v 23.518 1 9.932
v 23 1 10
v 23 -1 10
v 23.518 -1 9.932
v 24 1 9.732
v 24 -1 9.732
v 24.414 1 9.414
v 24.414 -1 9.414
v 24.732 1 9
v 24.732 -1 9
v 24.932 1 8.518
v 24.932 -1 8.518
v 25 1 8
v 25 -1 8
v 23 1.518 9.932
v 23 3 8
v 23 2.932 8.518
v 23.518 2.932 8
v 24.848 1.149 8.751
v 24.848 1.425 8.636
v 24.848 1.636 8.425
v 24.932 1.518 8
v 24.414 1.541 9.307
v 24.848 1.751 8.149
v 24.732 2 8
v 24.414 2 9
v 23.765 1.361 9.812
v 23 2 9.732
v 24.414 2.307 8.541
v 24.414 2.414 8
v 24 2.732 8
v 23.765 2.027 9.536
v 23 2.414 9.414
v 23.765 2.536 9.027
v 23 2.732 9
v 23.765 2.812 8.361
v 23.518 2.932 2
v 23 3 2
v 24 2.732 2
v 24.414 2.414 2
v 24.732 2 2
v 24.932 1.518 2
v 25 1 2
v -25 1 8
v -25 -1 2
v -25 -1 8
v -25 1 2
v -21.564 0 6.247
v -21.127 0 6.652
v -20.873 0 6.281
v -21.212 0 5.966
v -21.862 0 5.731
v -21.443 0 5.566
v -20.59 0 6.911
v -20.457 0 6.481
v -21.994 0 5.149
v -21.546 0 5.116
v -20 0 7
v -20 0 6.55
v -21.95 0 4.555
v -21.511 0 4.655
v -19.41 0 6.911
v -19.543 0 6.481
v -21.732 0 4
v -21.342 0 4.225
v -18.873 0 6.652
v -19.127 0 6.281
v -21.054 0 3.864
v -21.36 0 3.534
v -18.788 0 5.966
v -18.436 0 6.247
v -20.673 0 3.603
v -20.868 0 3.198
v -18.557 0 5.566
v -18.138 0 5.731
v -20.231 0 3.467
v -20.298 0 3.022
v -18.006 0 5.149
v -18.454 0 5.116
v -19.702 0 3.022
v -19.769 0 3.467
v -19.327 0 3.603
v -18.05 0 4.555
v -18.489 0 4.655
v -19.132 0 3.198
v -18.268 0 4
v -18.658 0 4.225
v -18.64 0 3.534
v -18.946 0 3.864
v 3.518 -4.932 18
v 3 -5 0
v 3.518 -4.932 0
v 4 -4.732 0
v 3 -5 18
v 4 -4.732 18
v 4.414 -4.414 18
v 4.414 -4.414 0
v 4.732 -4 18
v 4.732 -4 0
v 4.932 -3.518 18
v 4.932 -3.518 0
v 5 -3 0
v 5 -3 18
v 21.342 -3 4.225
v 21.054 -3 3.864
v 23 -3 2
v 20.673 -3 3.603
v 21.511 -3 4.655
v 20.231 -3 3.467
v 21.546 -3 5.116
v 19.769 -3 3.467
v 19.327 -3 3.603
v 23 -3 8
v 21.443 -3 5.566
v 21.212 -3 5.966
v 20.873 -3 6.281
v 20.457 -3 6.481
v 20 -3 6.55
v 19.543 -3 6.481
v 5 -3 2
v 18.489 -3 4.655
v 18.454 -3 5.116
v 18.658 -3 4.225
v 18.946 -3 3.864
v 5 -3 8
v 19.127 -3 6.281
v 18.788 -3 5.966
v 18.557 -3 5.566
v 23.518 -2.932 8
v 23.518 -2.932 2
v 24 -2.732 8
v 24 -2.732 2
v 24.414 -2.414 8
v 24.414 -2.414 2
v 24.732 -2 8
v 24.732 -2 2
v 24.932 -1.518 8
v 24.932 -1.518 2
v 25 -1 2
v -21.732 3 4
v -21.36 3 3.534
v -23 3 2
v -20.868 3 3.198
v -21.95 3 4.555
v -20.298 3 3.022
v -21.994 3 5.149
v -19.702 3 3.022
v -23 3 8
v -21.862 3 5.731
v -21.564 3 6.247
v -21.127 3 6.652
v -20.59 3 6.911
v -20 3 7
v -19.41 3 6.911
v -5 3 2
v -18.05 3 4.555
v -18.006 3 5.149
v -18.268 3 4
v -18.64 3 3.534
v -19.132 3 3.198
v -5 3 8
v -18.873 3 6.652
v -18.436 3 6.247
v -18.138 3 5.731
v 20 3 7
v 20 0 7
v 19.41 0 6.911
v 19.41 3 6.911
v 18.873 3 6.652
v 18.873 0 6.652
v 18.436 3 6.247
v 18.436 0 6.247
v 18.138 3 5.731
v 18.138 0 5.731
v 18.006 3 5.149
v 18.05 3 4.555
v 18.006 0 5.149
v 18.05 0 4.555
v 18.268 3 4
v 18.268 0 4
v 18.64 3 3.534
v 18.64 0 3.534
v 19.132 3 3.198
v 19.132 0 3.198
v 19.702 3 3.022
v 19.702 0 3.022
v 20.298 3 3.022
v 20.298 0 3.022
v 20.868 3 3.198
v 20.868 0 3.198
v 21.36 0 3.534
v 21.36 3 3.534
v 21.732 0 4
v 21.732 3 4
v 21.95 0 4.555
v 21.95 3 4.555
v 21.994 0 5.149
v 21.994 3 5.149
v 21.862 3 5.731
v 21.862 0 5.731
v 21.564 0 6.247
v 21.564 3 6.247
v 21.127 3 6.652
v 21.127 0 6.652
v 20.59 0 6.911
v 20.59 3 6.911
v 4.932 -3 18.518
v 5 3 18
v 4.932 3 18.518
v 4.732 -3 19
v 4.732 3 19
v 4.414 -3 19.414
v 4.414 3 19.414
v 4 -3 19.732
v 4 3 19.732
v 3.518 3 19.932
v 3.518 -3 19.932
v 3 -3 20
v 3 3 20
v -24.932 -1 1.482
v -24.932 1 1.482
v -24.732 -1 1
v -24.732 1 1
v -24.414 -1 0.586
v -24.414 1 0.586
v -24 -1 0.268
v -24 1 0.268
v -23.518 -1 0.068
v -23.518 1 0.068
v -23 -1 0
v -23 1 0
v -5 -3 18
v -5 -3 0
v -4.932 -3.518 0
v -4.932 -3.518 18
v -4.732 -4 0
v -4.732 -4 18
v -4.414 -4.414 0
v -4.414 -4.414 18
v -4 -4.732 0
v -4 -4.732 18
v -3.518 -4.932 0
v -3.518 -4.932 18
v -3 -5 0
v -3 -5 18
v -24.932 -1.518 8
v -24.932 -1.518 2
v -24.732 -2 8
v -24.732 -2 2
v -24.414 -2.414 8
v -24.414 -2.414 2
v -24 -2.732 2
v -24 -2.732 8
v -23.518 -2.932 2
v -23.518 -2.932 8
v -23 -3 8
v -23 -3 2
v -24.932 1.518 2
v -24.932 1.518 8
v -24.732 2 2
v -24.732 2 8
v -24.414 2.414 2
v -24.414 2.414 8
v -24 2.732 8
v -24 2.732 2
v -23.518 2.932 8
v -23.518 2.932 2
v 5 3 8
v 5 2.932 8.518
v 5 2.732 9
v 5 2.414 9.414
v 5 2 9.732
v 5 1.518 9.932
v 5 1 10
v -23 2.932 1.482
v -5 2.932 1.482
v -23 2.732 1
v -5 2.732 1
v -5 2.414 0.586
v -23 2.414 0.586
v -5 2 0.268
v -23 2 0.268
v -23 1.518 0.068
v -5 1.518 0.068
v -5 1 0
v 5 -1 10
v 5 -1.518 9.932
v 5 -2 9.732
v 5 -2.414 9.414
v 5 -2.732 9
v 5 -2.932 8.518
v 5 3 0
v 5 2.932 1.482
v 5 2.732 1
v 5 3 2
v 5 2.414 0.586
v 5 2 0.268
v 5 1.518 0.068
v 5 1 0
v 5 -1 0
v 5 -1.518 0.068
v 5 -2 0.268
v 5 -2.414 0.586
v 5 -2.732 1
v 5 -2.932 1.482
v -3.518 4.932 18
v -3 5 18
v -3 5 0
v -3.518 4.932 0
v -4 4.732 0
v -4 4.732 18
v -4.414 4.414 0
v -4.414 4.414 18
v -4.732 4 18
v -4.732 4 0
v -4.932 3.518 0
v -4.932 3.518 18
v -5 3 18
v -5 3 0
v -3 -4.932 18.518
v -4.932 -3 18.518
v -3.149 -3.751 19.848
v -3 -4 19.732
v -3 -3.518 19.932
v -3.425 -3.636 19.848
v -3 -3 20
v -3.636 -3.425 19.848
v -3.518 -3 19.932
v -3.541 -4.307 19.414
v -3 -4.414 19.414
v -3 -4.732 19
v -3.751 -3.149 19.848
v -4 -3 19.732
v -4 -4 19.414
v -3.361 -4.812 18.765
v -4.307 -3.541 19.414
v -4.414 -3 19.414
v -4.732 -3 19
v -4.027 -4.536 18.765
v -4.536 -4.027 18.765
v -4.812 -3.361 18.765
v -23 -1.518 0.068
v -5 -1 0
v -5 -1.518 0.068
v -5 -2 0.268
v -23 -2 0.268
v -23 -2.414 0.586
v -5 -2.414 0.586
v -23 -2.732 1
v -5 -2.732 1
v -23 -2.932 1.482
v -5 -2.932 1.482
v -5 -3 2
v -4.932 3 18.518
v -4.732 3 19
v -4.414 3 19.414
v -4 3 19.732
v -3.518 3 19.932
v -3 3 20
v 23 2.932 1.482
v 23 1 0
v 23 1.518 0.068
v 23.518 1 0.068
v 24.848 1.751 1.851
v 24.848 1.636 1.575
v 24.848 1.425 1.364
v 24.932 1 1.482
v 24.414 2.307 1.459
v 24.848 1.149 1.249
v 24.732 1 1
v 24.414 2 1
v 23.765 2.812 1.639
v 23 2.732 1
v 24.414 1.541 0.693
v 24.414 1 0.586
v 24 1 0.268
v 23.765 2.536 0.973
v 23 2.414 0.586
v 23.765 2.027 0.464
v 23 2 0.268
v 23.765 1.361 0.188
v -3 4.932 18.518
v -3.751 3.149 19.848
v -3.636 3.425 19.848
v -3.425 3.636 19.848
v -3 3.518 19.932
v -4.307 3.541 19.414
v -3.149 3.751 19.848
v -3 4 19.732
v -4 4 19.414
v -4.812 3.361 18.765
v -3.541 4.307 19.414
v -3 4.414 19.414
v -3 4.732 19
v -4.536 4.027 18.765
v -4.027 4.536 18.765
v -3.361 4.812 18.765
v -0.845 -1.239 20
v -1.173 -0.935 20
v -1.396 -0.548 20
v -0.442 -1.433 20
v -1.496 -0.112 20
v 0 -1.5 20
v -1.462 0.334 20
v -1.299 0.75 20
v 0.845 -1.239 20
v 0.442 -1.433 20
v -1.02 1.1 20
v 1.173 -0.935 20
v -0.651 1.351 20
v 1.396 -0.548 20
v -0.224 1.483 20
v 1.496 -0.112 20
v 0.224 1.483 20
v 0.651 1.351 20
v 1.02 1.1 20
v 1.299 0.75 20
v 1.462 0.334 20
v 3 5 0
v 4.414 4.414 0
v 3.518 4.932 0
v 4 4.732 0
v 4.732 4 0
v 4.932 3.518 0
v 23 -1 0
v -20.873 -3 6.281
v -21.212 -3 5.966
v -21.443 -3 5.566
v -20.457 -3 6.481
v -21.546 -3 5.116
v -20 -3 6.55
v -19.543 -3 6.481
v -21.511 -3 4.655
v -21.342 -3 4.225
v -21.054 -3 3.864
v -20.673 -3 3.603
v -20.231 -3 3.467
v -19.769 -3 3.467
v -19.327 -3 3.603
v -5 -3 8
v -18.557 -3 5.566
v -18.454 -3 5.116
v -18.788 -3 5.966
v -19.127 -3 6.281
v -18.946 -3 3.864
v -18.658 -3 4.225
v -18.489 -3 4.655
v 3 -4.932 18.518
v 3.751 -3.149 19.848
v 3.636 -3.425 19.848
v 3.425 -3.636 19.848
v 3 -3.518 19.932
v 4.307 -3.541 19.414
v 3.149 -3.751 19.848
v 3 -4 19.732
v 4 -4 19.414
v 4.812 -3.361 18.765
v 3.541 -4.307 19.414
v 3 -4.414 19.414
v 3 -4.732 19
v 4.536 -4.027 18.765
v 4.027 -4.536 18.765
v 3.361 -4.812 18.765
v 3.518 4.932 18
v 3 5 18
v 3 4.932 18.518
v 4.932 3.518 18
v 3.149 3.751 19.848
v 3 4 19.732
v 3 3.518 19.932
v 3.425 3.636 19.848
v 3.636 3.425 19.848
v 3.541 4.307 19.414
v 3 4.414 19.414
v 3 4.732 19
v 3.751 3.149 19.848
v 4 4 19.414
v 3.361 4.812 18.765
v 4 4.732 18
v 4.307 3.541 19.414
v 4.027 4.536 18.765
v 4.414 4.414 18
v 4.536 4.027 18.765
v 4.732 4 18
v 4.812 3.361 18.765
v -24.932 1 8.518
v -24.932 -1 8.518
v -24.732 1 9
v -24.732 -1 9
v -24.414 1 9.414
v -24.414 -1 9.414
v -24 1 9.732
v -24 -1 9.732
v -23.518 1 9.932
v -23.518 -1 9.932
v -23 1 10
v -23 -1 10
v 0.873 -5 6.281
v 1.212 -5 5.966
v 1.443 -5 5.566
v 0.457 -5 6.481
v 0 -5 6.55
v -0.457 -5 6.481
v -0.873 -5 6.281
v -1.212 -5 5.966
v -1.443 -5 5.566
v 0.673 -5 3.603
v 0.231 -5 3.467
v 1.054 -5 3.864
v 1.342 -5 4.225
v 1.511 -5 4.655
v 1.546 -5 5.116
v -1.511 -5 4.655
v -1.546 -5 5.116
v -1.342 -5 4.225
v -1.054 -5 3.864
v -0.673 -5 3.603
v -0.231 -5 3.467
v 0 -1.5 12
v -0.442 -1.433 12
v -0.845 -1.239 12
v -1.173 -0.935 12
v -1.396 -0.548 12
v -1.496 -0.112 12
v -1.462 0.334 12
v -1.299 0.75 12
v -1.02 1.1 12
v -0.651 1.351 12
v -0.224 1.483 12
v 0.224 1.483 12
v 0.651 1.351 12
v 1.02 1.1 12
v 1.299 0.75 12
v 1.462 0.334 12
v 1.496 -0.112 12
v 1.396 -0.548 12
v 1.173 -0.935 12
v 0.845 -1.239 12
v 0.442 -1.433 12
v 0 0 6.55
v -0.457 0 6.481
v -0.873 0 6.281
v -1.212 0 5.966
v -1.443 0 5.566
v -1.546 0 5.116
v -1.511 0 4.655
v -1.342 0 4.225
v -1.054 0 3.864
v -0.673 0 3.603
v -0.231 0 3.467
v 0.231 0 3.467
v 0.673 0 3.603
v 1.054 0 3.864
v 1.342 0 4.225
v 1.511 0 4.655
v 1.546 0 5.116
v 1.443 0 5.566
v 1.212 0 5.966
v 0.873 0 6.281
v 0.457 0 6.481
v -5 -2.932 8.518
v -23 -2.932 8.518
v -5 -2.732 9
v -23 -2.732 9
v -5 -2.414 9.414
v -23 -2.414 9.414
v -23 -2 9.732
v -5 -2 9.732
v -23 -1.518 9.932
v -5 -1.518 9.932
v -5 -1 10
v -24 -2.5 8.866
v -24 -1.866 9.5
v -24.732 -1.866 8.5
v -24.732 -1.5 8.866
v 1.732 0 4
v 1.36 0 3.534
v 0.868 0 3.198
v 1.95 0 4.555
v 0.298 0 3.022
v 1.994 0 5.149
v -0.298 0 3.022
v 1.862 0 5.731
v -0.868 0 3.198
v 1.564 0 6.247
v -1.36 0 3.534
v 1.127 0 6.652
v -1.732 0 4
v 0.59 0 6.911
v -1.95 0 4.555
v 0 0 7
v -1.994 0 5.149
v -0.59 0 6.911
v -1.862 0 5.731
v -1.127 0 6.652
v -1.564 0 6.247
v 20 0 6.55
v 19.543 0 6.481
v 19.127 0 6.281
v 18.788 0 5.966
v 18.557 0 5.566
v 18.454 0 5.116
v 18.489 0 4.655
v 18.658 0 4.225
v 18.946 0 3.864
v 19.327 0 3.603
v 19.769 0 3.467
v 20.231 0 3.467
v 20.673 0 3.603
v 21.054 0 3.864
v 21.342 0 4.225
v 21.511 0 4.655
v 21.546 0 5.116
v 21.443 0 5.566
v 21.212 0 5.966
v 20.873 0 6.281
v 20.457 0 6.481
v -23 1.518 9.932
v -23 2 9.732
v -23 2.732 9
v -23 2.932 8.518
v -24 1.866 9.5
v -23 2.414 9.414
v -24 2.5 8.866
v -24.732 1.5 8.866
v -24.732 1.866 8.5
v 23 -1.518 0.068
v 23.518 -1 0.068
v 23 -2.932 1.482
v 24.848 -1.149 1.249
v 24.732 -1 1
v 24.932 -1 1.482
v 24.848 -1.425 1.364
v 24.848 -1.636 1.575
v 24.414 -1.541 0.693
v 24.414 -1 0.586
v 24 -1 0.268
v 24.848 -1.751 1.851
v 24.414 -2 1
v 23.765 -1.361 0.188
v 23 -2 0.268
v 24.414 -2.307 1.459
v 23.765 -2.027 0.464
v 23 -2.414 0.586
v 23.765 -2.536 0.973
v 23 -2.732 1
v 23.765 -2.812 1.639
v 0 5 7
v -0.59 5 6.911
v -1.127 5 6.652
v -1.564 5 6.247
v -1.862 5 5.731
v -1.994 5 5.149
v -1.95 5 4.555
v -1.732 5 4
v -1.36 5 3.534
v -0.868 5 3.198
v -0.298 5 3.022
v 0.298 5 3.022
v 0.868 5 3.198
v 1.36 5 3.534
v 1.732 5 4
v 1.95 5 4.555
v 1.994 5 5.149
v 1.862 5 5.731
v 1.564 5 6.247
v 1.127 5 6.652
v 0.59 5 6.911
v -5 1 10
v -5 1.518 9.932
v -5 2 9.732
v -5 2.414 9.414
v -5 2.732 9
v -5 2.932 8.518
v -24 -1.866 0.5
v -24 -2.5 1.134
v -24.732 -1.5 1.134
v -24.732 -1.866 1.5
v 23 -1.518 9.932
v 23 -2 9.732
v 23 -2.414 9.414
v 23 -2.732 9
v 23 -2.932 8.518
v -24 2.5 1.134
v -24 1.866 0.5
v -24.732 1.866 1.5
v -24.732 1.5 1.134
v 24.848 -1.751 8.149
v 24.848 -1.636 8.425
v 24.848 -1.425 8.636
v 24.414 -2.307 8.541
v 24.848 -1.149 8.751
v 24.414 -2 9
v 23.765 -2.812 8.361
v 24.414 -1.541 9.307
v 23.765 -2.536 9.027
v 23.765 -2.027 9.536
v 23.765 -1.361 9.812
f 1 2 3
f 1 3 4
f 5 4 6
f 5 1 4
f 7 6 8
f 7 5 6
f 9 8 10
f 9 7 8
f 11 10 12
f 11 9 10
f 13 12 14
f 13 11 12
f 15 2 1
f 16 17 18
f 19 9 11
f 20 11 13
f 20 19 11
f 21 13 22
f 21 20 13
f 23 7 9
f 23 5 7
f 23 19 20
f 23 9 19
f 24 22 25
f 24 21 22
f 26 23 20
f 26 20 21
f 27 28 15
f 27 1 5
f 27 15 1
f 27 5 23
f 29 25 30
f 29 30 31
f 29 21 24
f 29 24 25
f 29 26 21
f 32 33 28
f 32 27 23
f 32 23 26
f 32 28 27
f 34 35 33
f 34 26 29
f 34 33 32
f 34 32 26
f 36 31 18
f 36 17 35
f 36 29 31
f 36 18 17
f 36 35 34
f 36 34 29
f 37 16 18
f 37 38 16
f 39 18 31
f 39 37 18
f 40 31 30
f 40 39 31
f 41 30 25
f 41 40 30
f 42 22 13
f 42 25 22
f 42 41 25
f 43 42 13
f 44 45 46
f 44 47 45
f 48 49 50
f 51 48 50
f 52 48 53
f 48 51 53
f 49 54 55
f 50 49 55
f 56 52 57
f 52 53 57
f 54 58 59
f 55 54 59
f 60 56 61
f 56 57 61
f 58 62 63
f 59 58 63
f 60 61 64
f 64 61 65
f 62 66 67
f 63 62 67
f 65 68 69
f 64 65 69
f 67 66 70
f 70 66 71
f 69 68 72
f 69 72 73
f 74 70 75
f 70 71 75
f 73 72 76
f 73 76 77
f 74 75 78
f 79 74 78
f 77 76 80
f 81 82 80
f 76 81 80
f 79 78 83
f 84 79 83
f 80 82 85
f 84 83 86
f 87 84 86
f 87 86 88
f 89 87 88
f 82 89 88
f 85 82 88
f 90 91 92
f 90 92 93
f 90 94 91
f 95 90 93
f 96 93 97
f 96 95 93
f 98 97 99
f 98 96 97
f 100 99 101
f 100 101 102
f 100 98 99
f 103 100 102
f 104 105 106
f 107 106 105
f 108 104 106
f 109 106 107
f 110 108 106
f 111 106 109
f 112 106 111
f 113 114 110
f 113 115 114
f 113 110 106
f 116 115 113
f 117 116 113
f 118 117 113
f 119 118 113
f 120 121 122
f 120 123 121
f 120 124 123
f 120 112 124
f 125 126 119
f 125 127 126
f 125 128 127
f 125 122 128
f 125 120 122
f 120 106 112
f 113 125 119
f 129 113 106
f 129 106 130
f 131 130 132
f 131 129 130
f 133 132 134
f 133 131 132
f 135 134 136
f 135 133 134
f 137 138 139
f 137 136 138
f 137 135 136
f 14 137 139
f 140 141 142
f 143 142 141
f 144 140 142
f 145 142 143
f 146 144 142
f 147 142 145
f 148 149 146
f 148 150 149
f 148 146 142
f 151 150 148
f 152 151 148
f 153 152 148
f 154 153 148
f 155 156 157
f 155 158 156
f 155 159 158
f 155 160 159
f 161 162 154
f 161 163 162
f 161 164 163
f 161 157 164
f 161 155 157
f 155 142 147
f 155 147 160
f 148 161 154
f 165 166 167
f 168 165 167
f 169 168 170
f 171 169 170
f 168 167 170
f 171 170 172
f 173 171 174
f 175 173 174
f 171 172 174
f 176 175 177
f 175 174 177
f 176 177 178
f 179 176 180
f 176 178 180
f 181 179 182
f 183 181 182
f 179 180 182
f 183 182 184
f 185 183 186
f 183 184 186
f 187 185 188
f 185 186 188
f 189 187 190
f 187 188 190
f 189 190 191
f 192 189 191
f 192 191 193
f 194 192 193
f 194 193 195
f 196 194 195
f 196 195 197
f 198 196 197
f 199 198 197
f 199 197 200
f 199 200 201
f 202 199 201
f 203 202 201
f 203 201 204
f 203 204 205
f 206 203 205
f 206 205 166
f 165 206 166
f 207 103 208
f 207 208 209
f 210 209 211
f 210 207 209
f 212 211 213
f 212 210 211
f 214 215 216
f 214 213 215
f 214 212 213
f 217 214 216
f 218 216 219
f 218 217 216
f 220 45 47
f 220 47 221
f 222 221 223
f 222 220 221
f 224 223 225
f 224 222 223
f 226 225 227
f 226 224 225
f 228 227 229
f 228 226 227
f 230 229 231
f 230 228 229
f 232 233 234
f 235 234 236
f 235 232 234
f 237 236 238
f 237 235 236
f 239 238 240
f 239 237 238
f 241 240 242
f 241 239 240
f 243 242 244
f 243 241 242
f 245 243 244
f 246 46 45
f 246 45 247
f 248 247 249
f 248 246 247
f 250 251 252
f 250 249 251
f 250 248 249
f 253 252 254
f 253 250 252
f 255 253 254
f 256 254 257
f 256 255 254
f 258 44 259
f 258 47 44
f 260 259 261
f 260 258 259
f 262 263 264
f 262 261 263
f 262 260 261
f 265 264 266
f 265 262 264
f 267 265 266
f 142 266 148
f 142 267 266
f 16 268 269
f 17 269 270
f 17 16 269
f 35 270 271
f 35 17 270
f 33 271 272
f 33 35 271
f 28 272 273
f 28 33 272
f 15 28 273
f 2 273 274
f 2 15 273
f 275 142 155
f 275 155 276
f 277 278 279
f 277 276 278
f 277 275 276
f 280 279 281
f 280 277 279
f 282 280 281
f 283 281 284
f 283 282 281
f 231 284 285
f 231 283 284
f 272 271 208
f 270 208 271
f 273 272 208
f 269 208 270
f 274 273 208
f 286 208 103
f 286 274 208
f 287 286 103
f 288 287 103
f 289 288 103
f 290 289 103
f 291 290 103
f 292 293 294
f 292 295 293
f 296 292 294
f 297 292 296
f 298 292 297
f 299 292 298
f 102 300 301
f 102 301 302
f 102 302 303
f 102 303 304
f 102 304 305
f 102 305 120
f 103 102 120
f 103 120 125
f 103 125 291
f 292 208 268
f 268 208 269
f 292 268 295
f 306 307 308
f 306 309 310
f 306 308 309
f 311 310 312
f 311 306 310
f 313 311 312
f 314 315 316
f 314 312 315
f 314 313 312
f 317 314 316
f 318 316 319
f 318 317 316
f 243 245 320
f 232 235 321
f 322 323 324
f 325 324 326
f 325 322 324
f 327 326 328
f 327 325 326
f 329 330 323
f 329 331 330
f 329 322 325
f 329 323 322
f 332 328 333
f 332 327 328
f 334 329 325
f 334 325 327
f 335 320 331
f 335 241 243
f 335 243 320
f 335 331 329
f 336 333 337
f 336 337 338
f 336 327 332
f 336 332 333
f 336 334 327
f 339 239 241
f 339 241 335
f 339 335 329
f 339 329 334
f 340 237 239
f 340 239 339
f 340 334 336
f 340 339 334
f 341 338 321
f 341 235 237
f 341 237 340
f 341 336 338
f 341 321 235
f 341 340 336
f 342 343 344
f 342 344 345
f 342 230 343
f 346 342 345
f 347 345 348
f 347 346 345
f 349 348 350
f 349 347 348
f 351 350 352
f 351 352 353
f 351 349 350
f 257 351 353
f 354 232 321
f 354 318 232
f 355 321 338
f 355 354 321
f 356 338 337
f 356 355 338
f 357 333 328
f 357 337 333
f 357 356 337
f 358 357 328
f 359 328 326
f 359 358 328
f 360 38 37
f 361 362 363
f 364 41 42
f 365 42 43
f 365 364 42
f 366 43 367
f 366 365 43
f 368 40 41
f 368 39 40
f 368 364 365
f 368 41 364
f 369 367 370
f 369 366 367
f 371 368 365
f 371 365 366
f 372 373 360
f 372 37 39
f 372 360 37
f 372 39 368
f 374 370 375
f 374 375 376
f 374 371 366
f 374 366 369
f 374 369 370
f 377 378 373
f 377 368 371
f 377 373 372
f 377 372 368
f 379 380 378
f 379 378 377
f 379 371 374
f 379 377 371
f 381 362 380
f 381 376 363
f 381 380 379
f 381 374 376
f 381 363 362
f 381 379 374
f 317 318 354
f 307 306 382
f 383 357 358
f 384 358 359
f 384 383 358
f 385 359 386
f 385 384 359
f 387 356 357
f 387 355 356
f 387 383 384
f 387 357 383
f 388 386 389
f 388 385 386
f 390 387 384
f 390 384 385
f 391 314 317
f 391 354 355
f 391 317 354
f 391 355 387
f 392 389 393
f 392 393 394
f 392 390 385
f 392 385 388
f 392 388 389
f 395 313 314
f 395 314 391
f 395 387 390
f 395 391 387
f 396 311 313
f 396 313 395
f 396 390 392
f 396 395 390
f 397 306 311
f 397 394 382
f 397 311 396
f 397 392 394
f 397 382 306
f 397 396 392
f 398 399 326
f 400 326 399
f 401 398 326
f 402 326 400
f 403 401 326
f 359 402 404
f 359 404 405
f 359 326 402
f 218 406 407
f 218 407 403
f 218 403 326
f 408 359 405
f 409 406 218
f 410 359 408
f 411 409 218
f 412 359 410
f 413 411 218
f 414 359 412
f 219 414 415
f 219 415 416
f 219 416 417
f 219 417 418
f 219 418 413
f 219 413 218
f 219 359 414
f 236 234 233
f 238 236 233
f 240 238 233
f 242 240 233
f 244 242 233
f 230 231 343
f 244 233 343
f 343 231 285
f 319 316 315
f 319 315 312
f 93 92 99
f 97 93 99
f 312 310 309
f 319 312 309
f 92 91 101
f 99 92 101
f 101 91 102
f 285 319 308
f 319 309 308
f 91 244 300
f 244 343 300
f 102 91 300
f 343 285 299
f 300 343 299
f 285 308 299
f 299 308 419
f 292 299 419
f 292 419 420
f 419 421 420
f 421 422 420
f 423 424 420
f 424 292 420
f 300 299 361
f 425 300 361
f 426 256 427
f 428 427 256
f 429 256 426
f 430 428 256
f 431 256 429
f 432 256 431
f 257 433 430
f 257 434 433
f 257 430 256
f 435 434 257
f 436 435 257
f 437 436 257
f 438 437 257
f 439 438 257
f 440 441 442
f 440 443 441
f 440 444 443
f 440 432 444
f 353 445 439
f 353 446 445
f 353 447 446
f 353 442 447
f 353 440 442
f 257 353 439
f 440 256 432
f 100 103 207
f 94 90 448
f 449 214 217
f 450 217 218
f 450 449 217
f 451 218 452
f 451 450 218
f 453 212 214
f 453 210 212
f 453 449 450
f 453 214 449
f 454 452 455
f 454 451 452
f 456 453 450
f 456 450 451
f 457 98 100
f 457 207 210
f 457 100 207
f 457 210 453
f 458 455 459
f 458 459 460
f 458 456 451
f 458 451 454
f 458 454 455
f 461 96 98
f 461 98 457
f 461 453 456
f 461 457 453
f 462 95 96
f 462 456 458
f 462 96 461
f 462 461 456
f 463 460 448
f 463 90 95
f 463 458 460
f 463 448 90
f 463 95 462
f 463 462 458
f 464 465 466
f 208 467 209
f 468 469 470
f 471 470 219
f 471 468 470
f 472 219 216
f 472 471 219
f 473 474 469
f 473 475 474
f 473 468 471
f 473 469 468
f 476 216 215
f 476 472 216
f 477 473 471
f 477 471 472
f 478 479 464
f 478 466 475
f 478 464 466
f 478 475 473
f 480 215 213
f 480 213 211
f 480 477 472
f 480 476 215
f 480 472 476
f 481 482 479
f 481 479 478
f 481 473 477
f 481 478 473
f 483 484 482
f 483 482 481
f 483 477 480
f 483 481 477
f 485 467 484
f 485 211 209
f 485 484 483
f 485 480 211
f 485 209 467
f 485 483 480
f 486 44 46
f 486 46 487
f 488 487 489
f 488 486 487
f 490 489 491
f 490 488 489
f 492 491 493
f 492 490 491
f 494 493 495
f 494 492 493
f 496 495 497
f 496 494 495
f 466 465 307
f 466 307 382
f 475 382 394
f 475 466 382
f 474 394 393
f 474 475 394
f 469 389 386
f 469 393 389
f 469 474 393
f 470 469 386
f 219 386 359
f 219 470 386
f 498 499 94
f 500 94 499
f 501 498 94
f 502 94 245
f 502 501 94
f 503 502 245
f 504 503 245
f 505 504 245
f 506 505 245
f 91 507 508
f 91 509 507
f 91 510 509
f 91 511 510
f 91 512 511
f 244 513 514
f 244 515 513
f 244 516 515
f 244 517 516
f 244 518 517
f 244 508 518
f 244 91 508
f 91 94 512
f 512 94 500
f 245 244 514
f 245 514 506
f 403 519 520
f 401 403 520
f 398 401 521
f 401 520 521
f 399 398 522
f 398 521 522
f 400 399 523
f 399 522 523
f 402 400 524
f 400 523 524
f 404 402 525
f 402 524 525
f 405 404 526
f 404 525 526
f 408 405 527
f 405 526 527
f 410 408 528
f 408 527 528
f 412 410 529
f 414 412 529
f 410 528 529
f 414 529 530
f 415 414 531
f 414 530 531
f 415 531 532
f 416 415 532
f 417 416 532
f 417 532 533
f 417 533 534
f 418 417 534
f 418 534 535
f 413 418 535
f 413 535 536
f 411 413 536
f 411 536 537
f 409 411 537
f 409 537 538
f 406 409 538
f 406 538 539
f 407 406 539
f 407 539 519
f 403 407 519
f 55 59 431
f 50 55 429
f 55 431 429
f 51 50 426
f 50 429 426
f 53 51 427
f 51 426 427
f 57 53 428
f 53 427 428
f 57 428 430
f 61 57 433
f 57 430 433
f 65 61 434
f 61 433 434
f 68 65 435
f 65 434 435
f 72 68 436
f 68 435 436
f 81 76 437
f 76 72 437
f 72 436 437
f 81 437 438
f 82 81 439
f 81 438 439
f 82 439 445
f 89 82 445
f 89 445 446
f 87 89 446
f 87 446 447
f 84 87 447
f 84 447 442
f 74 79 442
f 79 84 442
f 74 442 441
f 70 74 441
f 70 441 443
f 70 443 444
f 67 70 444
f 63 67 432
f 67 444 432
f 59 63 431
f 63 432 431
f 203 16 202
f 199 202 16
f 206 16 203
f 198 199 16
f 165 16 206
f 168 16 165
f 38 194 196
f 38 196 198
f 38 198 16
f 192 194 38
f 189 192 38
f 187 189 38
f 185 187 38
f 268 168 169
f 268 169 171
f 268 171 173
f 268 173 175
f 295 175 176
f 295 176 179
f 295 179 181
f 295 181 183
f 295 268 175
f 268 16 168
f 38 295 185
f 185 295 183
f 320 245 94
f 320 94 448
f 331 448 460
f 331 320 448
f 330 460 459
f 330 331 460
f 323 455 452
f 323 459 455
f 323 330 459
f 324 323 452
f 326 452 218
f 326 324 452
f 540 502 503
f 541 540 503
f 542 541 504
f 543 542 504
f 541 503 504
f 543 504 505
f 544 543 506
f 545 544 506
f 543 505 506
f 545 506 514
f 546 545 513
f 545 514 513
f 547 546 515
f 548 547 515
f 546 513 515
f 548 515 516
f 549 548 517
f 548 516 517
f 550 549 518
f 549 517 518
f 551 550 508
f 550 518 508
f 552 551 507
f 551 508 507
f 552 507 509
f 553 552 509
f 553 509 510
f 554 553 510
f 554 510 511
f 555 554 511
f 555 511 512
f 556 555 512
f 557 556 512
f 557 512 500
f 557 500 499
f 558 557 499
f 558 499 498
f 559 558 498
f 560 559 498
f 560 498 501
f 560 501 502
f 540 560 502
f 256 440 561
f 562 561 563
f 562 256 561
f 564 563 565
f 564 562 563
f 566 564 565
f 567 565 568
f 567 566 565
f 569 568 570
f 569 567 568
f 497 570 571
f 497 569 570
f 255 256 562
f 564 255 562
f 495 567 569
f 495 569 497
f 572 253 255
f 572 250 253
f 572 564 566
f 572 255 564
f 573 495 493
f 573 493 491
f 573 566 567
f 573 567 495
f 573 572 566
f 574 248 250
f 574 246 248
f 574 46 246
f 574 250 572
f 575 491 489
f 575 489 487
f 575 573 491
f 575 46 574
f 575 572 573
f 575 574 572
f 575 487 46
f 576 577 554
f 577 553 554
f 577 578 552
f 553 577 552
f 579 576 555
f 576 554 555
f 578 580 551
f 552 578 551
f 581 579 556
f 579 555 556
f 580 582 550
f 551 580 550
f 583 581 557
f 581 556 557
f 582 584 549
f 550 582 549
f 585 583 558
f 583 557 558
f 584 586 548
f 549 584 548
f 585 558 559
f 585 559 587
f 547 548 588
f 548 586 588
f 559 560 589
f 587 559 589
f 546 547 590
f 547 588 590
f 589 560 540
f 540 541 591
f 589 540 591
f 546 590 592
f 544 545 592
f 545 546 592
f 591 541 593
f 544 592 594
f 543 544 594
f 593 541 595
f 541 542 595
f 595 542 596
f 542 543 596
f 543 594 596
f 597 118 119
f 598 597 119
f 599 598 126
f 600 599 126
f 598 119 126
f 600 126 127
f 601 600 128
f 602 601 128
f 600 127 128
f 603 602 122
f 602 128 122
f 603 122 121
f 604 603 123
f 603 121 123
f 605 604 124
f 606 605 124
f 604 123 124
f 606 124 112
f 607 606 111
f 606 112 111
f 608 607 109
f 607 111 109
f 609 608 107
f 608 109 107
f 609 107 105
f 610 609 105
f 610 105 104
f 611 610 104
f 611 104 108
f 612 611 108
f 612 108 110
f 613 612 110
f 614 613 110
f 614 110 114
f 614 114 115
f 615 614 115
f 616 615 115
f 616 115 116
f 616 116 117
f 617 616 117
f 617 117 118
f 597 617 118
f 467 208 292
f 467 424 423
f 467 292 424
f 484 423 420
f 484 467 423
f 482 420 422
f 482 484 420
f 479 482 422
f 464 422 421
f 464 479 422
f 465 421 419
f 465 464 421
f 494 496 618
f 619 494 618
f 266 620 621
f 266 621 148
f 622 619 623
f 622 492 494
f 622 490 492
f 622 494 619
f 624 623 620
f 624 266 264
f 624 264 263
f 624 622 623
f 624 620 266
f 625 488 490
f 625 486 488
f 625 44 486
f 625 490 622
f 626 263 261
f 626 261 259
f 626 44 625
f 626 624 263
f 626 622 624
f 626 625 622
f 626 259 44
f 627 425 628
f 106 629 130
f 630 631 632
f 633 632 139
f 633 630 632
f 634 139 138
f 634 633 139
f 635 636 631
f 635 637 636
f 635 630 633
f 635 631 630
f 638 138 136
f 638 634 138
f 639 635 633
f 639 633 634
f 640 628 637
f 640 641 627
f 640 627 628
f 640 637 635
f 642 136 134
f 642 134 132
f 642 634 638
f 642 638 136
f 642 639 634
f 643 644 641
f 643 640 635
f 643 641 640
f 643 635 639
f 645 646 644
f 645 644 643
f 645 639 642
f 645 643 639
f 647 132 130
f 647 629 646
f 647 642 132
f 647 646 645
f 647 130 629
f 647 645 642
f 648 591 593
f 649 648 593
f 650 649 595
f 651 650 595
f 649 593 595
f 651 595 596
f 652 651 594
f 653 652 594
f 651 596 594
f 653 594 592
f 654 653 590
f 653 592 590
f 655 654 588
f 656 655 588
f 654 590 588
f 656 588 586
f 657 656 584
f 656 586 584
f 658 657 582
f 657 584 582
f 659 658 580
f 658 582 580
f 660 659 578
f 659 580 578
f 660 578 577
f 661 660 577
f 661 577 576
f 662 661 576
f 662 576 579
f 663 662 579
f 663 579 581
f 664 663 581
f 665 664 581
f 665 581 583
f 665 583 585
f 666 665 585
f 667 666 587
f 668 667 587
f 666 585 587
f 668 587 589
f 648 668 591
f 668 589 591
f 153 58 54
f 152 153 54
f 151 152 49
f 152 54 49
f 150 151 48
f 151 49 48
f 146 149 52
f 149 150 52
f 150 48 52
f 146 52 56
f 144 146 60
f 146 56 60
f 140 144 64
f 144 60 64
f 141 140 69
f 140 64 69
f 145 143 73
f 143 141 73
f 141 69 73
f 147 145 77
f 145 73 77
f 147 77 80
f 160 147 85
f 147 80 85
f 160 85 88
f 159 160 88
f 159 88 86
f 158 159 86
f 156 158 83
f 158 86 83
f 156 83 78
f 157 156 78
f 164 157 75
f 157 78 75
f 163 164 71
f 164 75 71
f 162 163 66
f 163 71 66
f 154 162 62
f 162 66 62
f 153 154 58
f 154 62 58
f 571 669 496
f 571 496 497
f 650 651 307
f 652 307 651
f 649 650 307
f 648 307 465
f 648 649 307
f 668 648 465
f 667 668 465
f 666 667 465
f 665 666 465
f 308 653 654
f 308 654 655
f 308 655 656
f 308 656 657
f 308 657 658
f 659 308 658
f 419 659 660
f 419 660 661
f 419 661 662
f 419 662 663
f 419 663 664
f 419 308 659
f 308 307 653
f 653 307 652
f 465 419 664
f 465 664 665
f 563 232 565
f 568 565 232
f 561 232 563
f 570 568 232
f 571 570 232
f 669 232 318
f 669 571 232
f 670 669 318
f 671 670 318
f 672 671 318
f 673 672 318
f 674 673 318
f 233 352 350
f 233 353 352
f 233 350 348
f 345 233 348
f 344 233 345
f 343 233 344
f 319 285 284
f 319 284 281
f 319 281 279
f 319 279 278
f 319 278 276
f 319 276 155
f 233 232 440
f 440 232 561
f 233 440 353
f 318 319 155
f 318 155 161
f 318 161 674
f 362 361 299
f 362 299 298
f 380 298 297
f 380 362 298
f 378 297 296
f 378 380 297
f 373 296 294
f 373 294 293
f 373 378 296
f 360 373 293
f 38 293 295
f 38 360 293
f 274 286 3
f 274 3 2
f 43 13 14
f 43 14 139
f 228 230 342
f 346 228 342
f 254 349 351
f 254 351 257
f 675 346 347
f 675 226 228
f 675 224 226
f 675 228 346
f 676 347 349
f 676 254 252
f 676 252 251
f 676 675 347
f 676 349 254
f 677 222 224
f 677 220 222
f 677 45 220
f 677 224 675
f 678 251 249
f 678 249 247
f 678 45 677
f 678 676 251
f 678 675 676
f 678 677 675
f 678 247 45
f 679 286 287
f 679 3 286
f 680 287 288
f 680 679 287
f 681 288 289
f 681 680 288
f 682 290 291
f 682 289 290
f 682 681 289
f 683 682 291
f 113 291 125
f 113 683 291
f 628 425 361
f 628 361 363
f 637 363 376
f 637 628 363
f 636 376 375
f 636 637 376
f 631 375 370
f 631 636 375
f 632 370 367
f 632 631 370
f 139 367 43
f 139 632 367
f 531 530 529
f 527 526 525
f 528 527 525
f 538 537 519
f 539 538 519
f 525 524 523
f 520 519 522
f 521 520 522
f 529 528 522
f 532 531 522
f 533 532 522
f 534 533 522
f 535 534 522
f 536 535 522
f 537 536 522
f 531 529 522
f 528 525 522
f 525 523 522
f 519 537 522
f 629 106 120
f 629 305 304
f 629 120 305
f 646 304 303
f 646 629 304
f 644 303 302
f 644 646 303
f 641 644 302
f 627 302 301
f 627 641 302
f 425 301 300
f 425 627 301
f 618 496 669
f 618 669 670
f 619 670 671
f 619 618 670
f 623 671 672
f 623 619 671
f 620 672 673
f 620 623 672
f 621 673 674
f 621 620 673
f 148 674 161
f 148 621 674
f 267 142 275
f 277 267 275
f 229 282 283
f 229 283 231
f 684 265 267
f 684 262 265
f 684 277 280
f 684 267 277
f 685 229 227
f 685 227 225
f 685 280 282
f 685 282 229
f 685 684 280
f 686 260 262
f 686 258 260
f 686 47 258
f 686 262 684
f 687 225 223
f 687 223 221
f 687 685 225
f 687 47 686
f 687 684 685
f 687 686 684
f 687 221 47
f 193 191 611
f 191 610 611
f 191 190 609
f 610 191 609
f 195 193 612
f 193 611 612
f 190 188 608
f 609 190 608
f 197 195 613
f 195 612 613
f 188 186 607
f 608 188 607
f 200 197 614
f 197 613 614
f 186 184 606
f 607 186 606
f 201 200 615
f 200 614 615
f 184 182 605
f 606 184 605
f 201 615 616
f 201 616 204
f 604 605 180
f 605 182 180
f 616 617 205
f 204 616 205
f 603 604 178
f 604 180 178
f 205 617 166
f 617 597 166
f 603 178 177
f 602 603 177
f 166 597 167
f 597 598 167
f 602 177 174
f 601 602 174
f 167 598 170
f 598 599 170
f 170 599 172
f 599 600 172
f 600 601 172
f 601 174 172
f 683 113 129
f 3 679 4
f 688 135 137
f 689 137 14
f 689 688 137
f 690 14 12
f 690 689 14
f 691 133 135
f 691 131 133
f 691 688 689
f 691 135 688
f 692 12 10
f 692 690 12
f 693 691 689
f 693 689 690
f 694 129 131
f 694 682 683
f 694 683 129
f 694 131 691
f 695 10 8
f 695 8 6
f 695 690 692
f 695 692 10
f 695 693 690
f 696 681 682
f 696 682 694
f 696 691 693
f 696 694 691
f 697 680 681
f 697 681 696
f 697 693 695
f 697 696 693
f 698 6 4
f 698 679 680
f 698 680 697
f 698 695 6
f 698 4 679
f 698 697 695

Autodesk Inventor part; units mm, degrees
ref_plane "YZ Plane" through (0, 0, 0) normal (1, 0, 0) x (0, 1, 0)
sketch "Sketch6" plane through (0, 0, 0) normal (0, 0, 1) x (1, 0, 0)
  line L0 (-5, 5) -> (5, 5)
  line L1 (5, 5) -> (5, -5)
  line L2 (5, -5) -> (-5, -5)
  line L3 (-5, -5) -> (-5, 5)
  point P0 (0, 0)
  dimension "d31" = 10
  dimension "d32" = 10
  dimension "d33" = 5
  dimension "d34" = 5
extrude "Extrusion3" add sketch "Sketch6" along normal blind 20
sketch "Sketch7" plane through (0, 0, 20) normal (0, 0, 1) x (1, 0, 0)
  point P0 (0, 0)
  point P1 (0, 0)
hole "Hole4" at (0, 0, 20) direction (0, 0, -1) diameter 3 depth 8
sketch "Sketch8" plane through (-5, 5, 0) normal (0, 1, 0) x (1, 0, 0)
  point P0 (5, 0)
  point P1 (5, -5)
  dimension "d44" = 5
hole "Hole5" at (0, 5, 5) direction (0, -1, 0) diameter 3.1 end through all counterbore diameter 4 counterbore depth 5
sketch "Sketch9" plane through (5, -5, 0) normal (1, 0, 0) x (0, 0, -1)
  line L0 (0, 10) -> (-20, 10) construction
  line L1 (-10, 10) -> (-10, 0) construction
  line L2 (0, 0) -> (-20, 0) construction
  line L3 (0, 0) -> (0, 10) projected
  line L4 (-10, 8) -> (0, 8)
  line L5 (0, 8) -> (0, 2)
  line L6 (0, 2) -> (-10, 2)
  line L7 (-10, 2) -> (-10, 8)
  line L8 (0, 5) -> (-20, 5)
  line L9 (-20, 10) -> (-20, 0) projected
  dimension "d52" = 6
extrude "Extrusion4" add sketch "Sketch9" along normal blind 20
ref_plane "Work Plane2" through (5, 3, 2) normal (0, 1, 0) x (1, 0, 0)
sketch "Sketch10" plane through (5, 3, 2) normal (0, 1, 0) x (1, 0, 0)
  line L0 (0, -6) -> (0, 0) construction
  line L1 (0, -3) -> (20, -3) construction
  line L2 (20, -6) -> (20, 0) construction
  point P0 (-5, 2)
  point P1 (15, -3)
  dimension "d56" = 5
hole "Hole6" at (20, 3, 5) direction (0, -1, 0) diameter 3.1 end through all counterbore diameter 4 counterbore depth 3
ref_plane "Work Plane1" through (0, -3, 18) normal (1, 0, 0) x (0, 0, -1)
mirror "Mirror1" about plane through (0, -3, 18) normal (1, 0, 0) of "Extrusion4", "Hole6"
fillet "Fillet3" radius 2 4 edges at (-15, 3, 0) (-15, 3, 10) (-15, -3, 10) (-15, -3, 0)
fillet "Fillet4" radius 2 12 edges at (15, 3, 0) (15, 3, 10) (15, -3, 0) (15, -3, 10) (5, 5, 10) (-5, 5, 10) (-5, -5, 10) (5, -5, 10) (-5, 0, 20) (5, 0, 20) (0, 5, 20) (0, -5, 20)
fillet "Fillet5" radius 2 16 edges at (25, -2.4142, 9.4142) (25, -3, 5) (25, -2.4142, 0.5858) (25, 0, 0) (25, 2.4142, 0.5858) (25, 3, 5) (25, 2.4142, 9.4142) (25, 0, 10) (-25, 0, 10) (-25, -2.4142, 9.4142) (-25, -3, 5) (-25, -2.4142, 0.5858) (-25, 0, 0) (-25, 2.4142, 0.5858) (-25, 3, 5) (-25, 2.4142, 9.4142)
